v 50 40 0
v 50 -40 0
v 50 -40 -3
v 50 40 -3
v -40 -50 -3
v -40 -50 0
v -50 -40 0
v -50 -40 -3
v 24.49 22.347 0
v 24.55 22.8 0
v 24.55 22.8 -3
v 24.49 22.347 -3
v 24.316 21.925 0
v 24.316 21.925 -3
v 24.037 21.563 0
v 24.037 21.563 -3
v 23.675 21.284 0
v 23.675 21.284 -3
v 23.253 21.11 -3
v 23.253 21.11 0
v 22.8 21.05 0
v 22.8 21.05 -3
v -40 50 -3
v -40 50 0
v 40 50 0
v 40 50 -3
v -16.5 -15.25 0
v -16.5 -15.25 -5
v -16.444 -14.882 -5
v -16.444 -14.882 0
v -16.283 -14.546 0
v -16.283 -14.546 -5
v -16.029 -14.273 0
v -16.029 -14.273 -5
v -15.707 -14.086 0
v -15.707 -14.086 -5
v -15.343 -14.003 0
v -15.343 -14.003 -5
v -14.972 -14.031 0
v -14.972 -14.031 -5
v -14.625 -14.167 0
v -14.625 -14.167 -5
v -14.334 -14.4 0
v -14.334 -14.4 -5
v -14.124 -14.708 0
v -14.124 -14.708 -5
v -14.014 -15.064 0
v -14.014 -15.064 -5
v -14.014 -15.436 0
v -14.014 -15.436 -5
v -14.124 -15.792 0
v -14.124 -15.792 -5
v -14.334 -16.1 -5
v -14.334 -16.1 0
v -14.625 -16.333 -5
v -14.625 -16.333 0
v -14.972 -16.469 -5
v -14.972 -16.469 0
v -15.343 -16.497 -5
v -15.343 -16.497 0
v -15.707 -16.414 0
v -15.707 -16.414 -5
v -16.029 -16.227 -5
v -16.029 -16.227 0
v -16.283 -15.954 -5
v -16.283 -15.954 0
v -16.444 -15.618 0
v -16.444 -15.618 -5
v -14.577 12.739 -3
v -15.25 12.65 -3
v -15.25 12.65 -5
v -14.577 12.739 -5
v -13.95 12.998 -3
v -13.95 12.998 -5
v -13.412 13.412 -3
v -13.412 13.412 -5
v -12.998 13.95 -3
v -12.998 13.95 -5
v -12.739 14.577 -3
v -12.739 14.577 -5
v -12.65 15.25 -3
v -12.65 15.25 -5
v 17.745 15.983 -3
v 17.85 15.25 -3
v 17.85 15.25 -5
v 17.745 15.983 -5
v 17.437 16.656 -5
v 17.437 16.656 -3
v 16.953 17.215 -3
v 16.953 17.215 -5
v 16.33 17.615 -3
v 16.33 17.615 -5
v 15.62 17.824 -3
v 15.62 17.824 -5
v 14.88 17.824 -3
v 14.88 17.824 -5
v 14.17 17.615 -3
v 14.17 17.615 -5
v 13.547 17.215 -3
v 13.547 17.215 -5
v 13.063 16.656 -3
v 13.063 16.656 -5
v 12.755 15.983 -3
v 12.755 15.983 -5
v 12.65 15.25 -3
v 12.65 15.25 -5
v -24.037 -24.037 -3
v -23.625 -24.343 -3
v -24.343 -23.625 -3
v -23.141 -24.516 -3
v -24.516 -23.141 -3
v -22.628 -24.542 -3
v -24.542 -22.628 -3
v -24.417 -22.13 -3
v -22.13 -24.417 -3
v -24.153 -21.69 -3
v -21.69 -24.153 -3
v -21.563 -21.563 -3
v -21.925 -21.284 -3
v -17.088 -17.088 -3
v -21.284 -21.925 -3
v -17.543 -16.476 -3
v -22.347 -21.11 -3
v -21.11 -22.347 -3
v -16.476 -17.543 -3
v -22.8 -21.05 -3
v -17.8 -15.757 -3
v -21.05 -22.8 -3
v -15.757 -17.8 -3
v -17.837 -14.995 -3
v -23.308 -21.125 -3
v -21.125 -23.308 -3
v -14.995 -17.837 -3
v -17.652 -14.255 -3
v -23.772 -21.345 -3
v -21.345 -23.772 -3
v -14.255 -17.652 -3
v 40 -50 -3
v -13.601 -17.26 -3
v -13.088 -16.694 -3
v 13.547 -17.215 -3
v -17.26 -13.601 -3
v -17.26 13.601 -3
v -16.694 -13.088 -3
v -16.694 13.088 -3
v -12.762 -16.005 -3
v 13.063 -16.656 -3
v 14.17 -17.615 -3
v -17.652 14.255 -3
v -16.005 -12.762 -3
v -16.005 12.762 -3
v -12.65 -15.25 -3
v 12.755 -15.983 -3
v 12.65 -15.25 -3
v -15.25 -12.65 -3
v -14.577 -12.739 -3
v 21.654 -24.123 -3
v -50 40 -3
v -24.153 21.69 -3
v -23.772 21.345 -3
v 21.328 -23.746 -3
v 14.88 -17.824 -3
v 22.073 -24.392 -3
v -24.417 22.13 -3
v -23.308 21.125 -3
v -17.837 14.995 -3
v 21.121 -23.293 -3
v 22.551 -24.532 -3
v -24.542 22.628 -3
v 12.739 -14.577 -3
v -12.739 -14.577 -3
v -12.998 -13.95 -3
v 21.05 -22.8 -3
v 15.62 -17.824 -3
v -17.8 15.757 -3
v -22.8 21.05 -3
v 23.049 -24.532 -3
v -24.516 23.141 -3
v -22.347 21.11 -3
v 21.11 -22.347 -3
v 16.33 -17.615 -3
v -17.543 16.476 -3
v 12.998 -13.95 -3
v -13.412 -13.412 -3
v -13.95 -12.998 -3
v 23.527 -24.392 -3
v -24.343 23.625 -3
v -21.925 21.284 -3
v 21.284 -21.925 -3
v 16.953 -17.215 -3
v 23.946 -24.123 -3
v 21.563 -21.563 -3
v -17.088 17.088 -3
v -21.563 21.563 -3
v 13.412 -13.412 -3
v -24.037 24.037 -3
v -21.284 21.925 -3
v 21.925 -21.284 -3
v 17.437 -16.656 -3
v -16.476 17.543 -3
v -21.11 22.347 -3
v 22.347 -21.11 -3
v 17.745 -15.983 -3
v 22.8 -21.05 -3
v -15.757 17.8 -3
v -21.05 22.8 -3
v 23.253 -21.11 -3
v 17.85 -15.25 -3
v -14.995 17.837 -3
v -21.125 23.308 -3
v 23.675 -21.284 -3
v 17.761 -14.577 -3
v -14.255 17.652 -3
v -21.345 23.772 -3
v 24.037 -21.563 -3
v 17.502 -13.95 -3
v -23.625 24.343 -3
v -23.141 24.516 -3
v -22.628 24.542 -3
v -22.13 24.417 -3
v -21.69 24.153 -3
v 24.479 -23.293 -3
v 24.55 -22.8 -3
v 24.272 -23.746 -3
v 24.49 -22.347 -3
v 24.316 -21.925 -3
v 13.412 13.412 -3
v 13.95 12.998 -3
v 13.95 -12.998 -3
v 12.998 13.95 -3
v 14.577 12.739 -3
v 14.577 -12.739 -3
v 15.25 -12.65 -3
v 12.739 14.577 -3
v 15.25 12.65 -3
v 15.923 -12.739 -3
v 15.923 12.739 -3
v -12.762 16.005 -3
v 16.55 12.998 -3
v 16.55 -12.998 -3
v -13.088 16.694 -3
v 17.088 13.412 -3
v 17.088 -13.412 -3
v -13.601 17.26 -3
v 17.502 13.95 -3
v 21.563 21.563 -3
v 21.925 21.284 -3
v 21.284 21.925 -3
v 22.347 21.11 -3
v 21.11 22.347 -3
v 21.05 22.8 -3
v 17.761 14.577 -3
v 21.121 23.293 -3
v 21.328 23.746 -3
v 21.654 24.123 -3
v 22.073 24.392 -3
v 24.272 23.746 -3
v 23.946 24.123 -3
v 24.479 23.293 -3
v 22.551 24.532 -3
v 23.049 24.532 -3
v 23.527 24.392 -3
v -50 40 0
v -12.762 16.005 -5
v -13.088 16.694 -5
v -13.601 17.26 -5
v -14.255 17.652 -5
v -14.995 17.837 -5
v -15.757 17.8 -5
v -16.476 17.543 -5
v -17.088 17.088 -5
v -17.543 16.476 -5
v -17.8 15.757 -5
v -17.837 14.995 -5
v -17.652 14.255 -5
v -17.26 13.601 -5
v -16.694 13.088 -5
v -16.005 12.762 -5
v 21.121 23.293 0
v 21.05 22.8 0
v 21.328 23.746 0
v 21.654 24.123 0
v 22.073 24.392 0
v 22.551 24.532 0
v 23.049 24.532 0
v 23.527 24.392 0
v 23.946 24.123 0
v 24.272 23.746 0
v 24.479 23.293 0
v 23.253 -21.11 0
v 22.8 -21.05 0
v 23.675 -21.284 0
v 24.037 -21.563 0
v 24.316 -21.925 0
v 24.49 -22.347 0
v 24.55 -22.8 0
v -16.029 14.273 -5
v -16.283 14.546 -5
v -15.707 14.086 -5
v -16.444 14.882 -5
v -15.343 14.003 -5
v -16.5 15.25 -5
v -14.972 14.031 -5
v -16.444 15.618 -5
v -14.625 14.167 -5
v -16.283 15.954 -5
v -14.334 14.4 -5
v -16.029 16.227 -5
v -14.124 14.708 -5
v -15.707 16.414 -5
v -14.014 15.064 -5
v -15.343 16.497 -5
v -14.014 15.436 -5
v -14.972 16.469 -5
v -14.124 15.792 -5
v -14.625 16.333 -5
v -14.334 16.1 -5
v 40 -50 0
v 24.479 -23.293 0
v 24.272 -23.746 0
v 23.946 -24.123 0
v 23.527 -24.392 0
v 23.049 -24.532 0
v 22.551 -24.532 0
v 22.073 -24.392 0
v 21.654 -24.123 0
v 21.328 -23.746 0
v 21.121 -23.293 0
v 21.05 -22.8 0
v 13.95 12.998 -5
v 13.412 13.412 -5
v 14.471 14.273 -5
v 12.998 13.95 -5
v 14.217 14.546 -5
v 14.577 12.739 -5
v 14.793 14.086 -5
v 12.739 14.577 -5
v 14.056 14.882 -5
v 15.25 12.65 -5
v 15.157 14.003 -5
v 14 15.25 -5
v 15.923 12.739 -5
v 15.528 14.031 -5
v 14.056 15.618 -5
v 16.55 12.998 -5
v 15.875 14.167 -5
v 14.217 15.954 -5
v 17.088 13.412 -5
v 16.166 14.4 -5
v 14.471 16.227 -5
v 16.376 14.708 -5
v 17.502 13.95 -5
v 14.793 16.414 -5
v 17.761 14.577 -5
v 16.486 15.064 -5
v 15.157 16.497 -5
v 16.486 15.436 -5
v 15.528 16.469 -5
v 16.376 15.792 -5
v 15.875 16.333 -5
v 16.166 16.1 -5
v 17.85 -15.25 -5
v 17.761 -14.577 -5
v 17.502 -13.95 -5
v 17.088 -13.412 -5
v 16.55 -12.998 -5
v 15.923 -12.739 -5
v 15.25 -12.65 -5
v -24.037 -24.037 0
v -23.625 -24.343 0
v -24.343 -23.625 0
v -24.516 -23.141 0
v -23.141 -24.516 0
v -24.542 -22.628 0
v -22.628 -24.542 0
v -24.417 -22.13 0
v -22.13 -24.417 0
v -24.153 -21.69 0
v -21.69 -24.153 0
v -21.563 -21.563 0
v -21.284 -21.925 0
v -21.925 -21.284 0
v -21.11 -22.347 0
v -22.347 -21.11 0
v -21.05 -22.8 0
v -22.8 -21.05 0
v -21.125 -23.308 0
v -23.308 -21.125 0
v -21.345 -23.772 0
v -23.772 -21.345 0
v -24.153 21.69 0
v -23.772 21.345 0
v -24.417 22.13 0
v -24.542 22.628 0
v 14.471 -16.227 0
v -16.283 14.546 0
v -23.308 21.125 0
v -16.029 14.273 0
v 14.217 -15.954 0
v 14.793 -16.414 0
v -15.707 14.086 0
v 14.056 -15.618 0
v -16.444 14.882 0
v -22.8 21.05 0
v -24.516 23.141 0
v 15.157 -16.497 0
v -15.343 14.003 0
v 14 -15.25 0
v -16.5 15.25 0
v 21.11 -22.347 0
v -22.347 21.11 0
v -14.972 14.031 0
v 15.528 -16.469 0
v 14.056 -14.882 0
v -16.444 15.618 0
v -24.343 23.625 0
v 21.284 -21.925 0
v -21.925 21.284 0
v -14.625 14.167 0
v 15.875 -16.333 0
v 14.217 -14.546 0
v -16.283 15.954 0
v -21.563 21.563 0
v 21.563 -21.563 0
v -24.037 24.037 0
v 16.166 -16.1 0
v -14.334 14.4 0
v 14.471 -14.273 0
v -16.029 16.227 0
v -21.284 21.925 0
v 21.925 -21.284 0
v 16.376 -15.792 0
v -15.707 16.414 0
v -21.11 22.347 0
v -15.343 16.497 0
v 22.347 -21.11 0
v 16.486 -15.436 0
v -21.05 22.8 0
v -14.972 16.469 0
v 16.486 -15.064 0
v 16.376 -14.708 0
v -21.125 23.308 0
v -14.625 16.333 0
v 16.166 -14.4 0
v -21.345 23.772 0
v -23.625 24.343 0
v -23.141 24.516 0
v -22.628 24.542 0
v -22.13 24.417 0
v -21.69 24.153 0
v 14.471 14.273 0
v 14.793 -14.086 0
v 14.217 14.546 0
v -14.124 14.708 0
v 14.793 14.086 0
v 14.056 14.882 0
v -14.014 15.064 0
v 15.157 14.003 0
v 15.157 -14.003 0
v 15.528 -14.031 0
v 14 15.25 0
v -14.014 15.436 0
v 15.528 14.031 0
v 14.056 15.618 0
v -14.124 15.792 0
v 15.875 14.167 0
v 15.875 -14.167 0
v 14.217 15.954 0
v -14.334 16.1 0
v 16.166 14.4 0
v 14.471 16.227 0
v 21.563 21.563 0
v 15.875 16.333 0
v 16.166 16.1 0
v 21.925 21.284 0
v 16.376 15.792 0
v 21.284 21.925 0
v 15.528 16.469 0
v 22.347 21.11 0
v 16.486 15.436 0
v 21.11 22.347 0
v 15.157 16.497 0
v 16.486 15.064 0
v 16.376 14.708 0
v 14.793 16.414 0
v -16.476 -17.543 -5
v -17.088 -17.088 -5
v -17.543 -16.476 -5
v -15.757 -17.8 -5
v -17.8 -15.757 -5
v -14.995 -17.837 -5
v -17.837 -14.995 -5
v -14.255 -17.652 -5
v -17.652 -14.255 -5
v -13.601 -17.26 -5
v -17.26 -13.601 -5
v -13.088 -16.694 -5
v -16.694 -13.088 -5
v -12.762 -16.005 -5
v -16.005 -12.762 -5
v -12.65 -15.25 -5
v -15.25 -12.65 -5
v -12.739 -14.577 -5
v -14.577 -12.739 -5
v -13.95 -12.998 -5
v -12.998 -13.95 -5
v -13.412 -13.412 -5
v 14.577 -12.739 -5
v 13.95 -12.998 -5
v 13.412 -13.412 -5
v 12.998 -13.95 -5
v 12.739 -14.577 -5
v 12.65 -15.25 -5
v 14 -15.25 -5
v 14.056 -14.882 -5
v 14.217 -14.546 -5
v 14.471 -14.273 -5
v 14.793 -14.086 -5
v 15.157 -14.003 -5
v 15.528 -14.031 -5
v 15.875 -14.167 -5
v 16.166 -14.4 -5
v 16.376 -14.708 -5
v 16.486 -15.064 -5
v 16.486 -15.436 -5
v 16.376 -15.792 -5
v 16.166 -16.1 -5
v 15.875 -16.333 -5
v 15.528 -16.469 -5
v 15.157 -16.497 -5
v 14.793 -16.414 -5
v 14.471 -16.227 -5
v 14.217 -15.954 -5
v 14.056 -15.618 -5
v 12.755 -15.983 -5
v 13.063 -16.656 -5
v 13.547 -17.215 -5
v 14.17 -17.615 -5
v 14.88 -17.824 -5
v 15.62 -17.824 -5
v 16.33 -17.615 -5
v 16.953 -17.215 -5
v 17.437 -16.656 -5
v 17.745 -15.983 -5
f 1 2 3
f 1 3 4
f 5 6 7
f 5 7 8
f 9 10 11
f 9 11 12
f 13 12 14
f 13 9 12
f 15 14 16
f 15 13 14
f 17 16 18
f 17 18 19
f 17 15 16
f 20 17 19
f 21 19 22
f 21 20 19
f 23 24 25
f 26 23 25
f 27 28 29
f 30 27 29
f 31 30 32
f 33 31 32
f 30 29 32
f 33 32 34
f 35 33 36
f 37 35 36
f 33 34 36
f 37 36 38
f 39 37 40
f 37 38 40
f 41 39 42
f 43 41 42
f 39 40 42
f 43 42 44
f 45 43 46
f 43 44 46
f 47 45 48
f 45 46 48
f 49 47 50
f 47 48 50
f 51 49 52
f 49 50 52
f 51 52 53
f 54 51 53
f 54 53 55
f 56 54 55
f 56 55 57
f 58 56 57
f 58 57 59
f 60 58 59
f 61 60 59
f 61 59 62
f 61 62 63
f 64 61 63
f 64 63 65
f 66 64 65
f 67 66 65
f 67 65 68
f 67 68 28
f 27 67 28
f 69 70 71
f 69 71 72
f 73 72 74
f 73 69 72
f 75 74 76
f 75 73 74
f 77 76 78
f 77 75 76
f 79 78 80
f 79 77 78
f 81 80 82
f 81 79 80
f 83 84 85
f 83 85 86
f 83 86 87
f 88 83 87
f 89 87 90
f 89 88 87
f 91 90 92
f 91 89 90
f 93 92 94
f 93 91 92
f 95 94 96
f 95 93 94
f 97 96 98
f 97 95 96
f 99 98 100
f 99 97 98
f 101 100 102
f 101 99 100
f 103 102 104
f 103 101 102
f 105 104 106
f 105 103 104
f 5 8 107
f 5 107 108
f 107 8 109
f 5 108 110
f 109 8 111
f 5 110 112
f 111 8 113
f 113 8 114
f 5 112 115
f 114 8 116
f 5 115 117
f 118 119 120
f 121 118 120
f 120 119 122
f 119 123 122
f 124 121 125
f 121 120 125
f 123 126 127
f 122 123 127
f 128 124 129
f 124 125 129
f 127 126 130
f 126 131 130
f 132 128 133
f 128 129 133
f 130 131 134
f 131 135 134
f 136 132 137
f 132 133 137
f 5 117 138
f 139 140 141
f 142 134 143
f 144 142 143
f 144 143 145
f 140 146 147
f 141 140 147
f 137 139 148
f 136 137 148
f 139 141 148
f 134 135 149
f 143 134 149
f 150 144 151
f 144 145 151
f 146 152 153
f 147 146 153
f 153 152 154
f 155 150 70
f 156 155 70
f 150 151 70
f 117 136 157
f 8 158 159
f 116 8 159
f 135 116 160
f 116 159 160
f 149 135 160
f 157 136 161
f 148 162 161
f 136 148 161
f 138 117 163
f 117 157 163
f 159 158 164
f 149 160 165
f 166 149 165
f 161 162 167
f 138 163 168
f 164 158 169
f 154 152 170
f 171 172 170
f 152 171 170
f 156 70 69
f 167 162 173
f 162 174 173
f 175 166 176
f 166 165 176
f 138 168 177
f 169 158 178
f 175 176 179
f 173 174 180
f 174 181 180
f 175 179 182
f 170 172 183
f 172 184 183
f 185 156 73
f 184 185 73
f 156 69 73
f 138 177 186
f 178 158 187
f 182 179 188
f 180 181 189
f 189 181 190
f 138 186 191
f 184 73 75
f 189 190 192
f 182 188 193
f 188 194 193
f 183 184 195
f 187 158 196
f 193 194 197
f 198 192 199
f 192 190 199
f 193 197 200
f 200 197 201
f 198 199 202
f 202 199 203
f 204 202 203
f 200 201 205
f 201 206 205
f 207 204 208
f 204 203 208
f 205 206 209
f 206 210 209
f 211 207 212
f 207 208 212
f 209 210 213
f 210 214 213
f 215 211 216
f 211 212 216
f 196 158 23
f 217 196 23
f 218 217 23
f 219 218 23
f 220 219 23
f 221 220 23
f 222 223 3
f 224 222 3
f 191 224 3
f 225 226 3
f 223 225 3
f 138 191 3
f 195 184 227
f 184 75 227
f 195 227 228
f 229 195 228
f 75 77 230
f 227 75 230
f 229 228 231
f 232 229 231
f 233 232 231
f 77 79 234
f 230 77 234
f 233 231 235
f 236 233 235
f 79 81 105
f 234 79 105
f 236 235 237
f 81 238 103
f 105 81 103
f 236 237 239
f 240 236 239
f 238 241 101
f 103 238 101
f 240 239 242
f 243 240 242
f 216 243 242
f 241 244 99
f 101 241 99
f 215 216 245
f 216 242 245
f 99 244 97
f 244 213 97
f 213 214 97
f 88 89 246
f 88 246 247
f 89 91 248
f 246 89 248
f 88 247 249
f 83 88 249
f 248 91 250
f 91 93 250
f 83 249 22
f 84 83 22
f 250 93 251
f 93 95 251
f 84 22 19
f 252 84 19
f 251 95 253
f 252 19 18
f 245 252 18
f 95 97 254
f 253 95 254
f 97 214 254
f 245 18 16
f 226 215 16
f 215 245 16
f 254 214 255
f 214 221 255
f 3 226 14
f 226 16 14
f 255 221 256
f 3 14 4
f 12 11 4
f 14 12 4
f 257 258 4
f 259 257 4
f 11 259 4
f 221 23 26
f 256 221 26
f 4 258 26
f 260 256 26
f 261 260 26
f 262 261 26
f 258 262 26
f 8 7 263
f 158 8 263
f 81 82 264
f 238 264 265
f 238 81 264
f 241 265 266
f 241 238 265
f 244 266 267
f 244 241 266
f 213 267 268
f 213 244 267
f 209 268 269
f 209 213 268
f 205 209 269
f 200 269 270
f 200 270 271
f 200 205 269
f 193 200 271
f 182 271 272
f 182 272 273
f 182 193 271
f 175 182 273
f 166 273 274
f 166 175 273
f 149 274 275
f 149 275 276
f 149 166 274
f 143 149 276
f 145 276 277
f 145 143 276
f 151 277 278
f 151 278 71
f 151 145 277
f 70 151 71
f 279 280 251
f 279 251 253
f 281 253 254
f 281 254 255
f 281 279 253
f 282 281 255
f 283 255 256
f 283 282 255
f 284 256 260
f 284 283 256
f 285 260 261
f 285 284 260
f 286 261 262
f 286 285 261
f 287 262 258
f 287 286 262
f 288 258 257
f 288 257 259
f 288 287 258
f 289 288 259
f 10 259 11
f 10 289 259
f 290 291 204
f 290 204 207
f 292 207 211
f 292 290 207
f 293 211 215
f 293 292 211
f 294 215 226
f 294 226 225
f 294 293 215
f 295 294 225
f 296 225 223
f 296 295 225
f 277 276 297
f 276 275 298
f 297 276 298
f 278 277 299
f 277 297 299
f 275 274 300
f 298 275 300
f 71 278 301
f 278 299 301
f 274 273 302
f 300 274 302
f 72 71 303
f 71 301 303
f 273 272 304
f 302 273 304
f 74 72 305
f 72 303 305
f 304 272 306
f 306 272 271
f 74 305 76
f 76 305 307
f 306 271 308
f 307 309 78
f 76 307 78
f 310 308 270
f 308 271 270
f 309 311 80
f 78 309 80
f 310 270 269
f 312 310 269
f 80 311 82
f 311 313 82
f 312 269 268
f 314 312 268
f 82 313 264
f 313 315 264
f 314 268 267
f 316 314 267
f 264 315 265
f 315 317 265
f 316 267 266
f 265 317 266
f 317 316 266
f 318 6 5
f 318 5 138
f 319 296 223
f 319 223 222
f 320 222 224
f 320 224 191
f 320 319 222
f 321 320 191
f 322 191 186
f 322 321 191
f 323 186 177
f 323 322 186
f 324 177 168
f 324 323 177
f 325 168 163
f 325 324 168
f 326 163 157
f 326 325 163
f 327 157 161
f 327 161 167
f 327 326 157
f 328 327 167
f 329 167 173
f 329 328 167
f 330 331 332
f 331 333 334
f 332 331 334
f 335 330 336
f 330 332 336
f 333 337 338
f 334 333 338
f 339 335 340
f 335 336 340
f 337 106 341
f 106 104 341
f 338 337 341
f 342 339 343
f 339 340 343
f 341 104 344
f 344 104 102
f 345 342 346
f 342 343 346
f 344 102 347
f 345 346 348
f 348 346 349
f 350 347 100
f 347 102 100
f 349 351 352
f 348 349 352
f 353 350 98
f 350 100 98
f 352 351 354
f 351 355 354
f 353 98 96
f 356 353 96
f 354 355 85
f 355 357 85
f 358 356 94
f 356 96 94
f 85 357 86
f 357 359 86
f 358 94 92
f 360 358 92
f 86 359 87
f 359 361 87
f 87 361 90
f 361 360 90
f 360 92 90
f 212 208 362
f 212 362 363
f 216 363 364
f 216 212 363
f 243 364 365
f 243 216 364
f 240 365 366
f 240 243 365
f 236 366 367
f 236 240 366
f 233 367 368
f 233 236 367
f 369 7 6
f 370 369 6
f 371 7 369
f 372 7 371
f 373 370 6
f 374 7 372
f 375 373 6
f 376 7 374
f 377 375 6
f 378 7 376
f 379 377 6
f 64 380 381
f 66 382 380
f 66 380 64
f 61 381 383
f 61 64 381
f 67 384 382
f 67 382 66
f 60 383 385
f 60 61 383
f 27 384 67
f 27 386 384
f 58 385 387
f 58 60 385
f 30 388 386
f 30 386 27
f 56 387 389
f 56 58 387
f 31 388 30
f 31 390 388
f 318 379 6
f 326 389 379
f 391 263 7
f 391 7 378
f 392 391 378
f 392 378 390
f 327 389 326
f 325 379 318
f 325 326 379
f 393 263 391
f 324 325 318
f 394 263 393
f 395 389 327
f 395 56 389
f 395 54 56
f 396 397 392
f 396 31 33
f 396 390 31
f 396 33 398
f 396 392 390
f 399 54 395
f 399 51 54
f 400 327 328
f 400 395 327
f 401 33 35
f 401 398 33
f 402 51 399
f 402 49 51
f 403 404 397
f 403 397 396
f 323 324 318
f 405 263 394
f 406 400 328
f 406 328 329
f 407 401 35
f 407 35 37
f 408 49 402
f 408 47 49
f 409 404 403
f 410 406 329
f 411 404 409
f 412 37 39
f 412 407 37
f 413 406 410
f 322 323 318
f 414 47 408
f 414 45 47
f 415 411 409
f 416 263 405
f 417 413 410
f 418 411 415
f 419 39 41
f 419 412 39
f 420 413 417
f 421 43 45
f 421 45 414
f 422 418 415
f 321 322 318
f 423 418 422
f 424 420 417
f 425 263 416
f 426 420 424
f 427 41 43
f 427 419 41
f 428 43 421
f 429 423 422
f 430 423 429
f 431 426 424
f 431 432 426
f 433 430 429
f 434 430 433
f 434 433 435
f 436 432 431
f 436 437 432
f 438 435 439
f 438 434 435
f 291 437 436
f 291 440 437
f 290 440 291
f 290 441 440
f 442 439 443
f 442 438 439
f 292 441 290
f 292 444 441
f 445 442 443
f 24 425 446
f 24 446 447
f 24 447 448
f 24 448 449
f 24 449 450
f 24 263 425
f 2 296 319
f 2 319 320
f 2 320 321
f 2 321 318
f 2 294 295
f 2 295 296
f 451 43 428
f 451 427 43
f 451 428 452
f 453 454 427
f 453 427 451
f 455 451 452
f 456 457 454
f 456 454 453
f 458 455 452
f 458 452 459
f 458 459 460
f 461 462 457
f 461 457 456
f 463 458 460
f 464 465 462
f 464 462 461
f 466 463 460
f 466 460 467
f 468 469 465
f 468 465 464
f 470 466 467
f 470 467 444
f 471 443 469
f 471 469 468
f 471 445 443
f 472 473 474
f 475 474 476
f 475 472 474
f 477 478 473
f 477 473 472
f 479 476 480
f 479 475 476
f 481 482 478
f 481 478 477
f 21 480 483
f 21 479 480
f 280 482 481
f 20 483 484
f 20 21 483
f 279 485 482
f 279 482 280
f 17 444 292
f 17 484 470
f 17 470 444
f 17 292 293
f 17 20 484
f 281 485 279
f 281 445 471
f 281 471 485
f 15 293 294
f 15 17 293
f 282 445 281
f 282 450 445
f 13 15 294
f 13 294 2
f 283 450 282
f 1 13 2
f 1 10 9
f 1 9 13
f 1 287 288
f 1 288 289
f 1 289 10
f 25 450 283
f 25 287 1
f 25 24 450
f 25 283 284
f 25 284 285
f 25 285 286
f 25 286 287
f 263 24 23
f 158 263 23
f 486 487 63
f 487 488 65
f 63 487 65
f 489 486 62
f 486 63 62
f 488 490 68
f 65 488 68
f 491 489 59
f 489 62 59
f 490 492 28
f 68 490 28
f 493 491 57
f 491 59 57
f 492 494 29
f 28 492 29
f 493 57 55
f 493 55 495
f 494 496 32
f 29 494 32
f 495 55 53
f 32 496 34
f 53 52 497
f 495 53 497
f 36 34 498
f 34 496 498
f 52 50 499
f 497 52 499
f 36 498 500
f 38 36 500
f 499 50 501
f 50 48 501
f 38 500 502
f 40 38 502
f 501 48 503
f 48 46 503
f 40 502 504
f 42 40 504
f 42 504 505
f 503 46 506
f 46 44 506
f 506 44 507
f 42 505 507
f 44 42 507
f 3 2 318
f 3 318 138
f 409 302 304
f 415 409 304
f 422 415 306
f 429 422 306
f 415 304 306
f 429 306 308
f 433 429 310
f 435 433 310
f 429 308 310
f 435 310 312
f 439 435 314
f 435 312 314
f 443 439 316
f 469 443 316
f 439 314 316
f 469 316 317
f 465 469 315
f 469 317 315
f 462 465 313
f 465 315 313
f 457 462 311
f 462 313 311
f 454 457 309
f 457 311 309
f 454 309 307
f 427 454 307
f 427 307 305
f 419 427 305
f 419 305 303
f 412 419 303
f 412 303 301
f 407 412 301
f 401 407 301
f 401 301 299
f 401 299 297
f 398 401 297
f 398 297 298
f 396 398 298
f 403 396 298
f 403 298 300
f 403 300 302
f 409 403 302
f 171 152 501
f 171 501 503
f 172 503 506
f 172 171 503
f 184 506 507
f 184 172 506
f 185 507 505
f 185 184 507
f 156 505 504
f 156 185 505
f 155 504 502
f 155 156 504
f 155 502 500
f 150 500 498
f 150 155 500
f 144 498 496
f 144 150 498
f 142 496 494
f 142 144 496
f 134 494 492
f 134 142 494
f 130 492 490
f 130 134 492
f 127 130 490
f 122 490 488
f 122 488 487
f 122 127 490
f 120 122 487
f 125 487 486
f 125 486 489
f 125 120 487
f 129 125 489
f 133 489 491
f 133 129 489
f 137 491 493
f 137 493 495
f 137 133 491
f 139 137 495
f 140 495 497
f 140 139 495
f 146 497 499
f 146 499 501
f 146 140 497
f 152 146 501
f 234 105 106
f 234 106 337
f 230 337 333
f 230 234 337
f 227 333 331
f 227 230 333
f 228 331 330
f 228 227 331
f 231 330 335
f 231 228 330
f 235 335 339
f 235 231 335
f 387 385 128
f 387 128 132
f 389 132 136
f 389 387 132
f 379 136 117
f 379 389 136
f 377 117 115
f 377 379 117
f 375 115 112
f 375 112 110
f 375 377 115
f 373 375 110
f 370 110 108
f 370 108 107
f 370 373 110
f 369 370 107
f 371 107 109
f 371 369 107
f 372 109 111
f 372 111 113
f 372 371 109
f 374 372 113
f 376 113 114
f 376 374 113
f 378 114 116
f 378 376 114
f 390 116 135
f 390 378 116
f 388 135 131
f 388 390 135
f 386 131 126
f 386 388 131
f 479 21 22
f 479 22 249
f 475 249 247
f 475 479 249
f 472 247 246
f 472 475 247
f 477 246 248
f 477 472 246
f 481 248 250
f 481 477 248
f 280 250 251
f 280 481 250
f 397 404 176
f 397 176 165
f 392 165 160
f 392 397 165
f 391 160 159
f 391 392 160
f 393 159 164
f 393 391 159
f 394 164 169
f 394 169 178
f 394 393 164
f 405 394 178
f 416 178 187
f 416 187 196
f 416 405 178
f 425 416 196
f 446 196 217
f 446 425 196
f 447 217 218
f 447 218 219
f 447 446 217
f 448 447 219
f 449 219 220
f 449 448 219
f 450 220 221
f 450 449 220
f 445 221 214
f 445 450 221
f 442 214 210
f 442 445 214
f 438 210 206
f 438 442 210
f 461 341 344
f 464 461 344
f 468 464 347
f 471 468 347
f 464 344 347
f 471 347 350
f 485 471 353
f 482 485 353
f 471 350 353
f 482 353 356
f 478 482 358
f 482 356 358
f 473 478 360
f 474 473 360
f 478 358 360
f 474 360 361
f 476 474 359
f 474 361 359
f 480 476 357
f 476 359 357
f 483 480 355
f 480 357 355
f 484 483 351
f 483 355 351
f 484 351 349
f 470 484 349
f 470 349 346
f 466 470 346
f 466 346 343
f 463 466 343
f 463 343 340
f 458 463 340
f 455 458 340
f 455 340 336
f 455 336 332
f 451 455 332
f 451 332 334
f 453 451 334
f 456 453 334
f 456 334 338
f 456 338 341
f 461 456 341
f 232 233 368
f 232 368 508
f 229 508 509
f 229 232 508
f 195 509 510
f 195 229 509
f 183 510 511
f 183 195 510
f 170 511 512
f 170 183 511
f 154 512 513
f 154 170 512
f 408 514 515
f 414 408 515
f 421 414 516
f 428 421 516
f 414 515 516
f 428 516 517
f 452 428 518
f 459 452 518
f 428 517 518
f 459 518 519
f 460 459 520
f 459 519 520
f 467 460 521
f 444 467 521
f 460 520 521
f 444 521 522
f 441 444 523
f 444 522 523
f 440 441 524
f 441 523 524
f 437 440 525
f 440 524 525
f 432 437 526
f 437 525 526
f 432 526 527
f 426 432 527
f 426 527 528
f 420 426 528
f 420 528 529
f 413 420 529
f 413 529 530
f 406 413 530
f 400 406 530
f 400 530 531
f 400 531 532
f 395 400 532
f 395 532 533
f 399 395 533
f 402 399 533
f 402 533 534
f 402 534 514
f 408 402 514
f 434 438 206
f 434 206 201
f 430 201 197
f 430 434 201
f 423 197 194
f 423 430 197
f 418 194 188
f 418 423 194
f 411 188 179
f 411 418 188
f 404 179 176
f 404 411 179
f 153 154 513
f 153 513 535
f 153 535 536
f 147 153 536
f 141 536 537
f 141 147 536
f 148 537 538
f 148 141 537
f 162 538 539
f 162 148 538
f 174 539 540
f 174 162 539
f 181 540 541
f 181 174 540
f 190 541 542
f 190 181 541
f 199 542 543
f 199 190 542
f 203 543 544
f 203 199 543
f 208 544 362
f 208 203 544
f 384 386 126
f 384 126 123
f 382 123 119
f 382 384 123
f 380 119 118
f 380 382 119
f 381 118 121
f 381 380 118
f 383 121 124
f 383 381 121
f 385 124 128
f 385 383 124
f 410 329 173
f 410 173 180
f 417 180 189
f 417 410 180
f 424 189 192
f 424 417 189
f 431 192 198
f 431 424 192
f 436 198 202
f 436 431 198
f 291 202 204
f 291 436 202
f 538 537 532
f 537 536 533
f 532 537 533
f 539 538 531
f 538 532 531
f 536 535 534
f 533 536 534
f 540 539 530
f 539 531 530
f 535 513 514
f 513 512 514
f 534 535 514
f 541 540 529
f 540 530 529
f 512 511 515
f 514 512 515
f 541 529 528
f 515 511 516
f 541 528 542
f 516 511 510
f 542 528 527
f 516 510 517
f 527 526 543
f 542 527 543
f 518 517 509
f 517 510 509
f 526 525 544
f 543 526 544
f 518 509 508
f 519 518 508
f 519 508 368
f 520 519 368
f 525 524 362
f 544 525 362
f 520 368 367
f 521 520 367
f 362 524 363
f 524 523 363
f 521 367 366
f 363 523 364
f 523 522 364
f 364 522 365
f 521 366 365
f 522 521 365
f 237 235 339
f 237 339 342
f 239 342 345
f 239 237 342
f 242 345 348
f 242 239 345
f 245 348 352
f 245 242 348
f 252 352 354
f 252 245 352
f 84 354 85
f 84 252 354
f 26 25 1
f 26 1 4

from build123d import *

# Parameters (mm, degrees)
F0_W     = 100
F0_H     = 100
F1_DEPTH = 3
F2_DEPTH = 5
F3_D     = 2.5
F3_DEPTH = 6
F3_TIP   = 0.7510757738
F4_SIZE  = 10


with BuildPart() as f1:
    # F0 (on Top) → F1 (new body)
    with BuildSketch(Plane.XY):
        Rectangle(F0_W, F0_H)
        with BuildLine():
            Line((21.05, -22.8), (-21.05, -22.8))
            ThreePointArc((-21.05, -22.8), (-24.0374368671, -24.0374368671), (-22.8, -21.05))
            Line((-22.8, -21.05), (-22.8, 21.05))
            ThreePointArc((-22.8, 21.05), (-24.0374368671, 24.0374368671), (-21.05, 22.8))
            Line((-21.05, 22.8), (21.05, 22.8))
            ThreePointArc((21.05, 22.8), (22.8, 24.55), (24.55, 22.8))
            ThreePointArc((24.55, 22.8), (24.0374368671, 21.5625631329), (22.8, 21.05))
            Line((22.8, 21.05), (22.8, -21.05))
            ThreePointArc((22.8, -21.05), (24.0374368671, -21.5625631329), (24.55, -22.8))
            ThreePointArc((24.55, -22.8), (22.8, -24.55), (21.05, -22.8))
        make_face(mode=Mode.SUBTRACT)
        with BuildLine():
            ThreePointArc((-22.8, -21.05), (-21.5625631329, -21.5625631329), (-21.05, -22.8))
            Line((-21.05, -22.8), (21.05, -22.8))
            ThreePointArc((21.05, -22.8), (21.5625631329, -21.5625631329), (22.8, -21.05))
            Line((22.8, -21.05), (22.8, 21.05))
            ThreePointArc((22.8, 21.05), (21.5625631329, 21.5625631329), (21.05, 22.8))
            Line((21.05, 22.8), (-21.05, 22.8))
            ThreePointArc((-21.05, 22.8), (-21.5625631329, 21.5625631329), (-22.8, 21.05))
            Line((-22.8, 21.05), (-22.8, -21.05))
        make_face()
        with BuildLine():
            Line((12.65, -15.25), (-12.65, -15.25))
            ThreePointArc((-12.65, -15.25), (-17.0884776311, -17.0884776311), (-15.25, -12.65))
            Line((-15.25, -12.65), (-15.25, 12.65))
            ThreePointArc((-15.25, 12.65), (-17.0884776311, 17.0884776311), (-12.65, 15.25))
            Line((-12.65, 15.25), (12.65, 15.25))
            ThreePointArc((12.65, 15.25), (15.25, 17.85), (17.85, 15.25))
            ThreePointArc((17.85, 15.25), (17.0884776311, 13.4115223689), (15.25, 12.65))
            Line((15.25, 12.65), (15.25, -12.65))
            ThreePointArc((15.25, -12.65), (17.0884776311, -13.4115223689), (17.85, -15.25))
            ThreePointArc((17.85, -15.25), (15.25, -17.85), (12.65, -15.25))
        make_face(mode=Mode.SUBTRACT)
        with BuildLine():
            ThreePointArc((-15.25, -12.65), (-13.4115223689, -13.4115223689), (-12.65, -15.25))
            Line((-12.65, -15.25), (12.65, -15.25))
            ThreePointArc((12.65, -15.25), (13.4115223689, -13.4115223689), (15.25, -12.65))
            Line((15.25, -12.65), (15.25, 12.65))
            ThreePointArc((15.25, 12.65), (13.4115223689, 13.4115223689), (12.65, 15.25))
            Line((12.65, 15.25), (-12.65, 15.25))
            ThreePointArc((-12.65, 15.25), (-13.4115223689, 13.4115223689), (-15.25, 12.65))
            Line((-15.25, 12.65), (-15.25, -12.65))
        make_face()
    extrude(amount=-F1_DEPTH)

    # F0 (on Top) → F2 (join)
    with BuildSketch(Plane.XY):
        with BuildLine():
            Line((-15.25, -15.25), (-12.65, -15.25))
            ThreePointArc((-12.65, -15.25), (-13.4115223689, -13.4115223689), (-15.25, -12.65))
            Line((-15.25, -12.65), (-15.25, -15.25))
        make_face()
        with BuildLine():
            ThreePointArc((-15.25, -12.65), (-17.0884776311, -17.0884776311), (-12.65, -15.25))
            Line((-12.65, -15.25), (-15.25, -15.25))
            Line((-15.25, -15.25), (-15.25, -12.65))
        make_face()
        with BuildLine():
            Line((15.25, -15.25), (12.65, -15.25))
            ThreePointArc((12.65, -15.25), (15.25, -17.85), (17.85, -15.25))
            ThreePointArc((17.85, -15.25), (17.0884776311, -13.4115223689), (15.25, -12.65))
            Line((15.25, -12.65), (15.25, -15.25))
        make_face()
        with BuildLine():
            ThreePointArc((15.25, -12.65), (13.4115223689, -13.4115223689), (12.65, -15.25))
            Line((12.65, -15.25), (15.25, -15.25))
            Line((15.25, -15.25), (15.25, -12.65))
        make_face()
        with BuildLine():
            Line((-15.25, 15.25), (-15.25, 12.65))
            ThreePointArc((-15.25, 12.65), (-13.4115223689, 13.4115223689), (-12.65, 15.25))
            Line((-12.65, 15.25), (-15.25, 15.25))
        make_face()
        with BuildLine():
            ThreePointArc((-12.65, 15.25), (-17.0884776311, 17.0884776311), (-15.25, 12.65))
            Line((-15.25, 12.65), (-15.25, 15.25))
            Line((-15.25, 15.25), (-12.65, 15.25))
        make_face()
        with BuildLine():
            ThreePointArc((12.65, 15.25), (13.4115223689, 13.4115223689), (15.25, 12.65))
            Line((15.25, 12.65), (15.25, 15.25))
            Line((15.25, 15.25), (12.65, 15.25))
        make_face()
        with BuildLine():
            Line((15.25, 15.25), (15.25, 12.65))
            ThreePointArc((15.25, 12.65), (17.0884776311, 13.4115223689), (17.85, 15.25))
            ThreePointArc((17.85, 15.25), (15.25, 17.85), (12.65, 15.25))
            Line((12.65, 15.25), (15.25, 15.25))
        make_face()
    extrude(amount=-F2_DEPTH)

    # F3
    with Locations(Plane.XY):
        with Locations((-15.25, -15.25), (-15.25, 15.25), (15.25, 15.25), (15.25, -15.25)):
            Hole(F3_D / 2, depth=F3_DEPTH)
            with Locations((0, 0, -(F3_DEPTH + F3_TIP / 2))):  # 118° drill point
                Cone(0, F3_D / 2, F3_TIP, mode=Mode.SUBTRACT)

    # F4
    f4_edges = [f1.edges().sort_by_distance(p)[0] for p in [
        (-50, 50, -1.5),
        (50, 50, -1.5),
        (50, -50, -1.5),
        (-50, -50, -1.5),
    ]]
    chamfer(f4_edges, length=F4_SIZE)


solid = f1.part
